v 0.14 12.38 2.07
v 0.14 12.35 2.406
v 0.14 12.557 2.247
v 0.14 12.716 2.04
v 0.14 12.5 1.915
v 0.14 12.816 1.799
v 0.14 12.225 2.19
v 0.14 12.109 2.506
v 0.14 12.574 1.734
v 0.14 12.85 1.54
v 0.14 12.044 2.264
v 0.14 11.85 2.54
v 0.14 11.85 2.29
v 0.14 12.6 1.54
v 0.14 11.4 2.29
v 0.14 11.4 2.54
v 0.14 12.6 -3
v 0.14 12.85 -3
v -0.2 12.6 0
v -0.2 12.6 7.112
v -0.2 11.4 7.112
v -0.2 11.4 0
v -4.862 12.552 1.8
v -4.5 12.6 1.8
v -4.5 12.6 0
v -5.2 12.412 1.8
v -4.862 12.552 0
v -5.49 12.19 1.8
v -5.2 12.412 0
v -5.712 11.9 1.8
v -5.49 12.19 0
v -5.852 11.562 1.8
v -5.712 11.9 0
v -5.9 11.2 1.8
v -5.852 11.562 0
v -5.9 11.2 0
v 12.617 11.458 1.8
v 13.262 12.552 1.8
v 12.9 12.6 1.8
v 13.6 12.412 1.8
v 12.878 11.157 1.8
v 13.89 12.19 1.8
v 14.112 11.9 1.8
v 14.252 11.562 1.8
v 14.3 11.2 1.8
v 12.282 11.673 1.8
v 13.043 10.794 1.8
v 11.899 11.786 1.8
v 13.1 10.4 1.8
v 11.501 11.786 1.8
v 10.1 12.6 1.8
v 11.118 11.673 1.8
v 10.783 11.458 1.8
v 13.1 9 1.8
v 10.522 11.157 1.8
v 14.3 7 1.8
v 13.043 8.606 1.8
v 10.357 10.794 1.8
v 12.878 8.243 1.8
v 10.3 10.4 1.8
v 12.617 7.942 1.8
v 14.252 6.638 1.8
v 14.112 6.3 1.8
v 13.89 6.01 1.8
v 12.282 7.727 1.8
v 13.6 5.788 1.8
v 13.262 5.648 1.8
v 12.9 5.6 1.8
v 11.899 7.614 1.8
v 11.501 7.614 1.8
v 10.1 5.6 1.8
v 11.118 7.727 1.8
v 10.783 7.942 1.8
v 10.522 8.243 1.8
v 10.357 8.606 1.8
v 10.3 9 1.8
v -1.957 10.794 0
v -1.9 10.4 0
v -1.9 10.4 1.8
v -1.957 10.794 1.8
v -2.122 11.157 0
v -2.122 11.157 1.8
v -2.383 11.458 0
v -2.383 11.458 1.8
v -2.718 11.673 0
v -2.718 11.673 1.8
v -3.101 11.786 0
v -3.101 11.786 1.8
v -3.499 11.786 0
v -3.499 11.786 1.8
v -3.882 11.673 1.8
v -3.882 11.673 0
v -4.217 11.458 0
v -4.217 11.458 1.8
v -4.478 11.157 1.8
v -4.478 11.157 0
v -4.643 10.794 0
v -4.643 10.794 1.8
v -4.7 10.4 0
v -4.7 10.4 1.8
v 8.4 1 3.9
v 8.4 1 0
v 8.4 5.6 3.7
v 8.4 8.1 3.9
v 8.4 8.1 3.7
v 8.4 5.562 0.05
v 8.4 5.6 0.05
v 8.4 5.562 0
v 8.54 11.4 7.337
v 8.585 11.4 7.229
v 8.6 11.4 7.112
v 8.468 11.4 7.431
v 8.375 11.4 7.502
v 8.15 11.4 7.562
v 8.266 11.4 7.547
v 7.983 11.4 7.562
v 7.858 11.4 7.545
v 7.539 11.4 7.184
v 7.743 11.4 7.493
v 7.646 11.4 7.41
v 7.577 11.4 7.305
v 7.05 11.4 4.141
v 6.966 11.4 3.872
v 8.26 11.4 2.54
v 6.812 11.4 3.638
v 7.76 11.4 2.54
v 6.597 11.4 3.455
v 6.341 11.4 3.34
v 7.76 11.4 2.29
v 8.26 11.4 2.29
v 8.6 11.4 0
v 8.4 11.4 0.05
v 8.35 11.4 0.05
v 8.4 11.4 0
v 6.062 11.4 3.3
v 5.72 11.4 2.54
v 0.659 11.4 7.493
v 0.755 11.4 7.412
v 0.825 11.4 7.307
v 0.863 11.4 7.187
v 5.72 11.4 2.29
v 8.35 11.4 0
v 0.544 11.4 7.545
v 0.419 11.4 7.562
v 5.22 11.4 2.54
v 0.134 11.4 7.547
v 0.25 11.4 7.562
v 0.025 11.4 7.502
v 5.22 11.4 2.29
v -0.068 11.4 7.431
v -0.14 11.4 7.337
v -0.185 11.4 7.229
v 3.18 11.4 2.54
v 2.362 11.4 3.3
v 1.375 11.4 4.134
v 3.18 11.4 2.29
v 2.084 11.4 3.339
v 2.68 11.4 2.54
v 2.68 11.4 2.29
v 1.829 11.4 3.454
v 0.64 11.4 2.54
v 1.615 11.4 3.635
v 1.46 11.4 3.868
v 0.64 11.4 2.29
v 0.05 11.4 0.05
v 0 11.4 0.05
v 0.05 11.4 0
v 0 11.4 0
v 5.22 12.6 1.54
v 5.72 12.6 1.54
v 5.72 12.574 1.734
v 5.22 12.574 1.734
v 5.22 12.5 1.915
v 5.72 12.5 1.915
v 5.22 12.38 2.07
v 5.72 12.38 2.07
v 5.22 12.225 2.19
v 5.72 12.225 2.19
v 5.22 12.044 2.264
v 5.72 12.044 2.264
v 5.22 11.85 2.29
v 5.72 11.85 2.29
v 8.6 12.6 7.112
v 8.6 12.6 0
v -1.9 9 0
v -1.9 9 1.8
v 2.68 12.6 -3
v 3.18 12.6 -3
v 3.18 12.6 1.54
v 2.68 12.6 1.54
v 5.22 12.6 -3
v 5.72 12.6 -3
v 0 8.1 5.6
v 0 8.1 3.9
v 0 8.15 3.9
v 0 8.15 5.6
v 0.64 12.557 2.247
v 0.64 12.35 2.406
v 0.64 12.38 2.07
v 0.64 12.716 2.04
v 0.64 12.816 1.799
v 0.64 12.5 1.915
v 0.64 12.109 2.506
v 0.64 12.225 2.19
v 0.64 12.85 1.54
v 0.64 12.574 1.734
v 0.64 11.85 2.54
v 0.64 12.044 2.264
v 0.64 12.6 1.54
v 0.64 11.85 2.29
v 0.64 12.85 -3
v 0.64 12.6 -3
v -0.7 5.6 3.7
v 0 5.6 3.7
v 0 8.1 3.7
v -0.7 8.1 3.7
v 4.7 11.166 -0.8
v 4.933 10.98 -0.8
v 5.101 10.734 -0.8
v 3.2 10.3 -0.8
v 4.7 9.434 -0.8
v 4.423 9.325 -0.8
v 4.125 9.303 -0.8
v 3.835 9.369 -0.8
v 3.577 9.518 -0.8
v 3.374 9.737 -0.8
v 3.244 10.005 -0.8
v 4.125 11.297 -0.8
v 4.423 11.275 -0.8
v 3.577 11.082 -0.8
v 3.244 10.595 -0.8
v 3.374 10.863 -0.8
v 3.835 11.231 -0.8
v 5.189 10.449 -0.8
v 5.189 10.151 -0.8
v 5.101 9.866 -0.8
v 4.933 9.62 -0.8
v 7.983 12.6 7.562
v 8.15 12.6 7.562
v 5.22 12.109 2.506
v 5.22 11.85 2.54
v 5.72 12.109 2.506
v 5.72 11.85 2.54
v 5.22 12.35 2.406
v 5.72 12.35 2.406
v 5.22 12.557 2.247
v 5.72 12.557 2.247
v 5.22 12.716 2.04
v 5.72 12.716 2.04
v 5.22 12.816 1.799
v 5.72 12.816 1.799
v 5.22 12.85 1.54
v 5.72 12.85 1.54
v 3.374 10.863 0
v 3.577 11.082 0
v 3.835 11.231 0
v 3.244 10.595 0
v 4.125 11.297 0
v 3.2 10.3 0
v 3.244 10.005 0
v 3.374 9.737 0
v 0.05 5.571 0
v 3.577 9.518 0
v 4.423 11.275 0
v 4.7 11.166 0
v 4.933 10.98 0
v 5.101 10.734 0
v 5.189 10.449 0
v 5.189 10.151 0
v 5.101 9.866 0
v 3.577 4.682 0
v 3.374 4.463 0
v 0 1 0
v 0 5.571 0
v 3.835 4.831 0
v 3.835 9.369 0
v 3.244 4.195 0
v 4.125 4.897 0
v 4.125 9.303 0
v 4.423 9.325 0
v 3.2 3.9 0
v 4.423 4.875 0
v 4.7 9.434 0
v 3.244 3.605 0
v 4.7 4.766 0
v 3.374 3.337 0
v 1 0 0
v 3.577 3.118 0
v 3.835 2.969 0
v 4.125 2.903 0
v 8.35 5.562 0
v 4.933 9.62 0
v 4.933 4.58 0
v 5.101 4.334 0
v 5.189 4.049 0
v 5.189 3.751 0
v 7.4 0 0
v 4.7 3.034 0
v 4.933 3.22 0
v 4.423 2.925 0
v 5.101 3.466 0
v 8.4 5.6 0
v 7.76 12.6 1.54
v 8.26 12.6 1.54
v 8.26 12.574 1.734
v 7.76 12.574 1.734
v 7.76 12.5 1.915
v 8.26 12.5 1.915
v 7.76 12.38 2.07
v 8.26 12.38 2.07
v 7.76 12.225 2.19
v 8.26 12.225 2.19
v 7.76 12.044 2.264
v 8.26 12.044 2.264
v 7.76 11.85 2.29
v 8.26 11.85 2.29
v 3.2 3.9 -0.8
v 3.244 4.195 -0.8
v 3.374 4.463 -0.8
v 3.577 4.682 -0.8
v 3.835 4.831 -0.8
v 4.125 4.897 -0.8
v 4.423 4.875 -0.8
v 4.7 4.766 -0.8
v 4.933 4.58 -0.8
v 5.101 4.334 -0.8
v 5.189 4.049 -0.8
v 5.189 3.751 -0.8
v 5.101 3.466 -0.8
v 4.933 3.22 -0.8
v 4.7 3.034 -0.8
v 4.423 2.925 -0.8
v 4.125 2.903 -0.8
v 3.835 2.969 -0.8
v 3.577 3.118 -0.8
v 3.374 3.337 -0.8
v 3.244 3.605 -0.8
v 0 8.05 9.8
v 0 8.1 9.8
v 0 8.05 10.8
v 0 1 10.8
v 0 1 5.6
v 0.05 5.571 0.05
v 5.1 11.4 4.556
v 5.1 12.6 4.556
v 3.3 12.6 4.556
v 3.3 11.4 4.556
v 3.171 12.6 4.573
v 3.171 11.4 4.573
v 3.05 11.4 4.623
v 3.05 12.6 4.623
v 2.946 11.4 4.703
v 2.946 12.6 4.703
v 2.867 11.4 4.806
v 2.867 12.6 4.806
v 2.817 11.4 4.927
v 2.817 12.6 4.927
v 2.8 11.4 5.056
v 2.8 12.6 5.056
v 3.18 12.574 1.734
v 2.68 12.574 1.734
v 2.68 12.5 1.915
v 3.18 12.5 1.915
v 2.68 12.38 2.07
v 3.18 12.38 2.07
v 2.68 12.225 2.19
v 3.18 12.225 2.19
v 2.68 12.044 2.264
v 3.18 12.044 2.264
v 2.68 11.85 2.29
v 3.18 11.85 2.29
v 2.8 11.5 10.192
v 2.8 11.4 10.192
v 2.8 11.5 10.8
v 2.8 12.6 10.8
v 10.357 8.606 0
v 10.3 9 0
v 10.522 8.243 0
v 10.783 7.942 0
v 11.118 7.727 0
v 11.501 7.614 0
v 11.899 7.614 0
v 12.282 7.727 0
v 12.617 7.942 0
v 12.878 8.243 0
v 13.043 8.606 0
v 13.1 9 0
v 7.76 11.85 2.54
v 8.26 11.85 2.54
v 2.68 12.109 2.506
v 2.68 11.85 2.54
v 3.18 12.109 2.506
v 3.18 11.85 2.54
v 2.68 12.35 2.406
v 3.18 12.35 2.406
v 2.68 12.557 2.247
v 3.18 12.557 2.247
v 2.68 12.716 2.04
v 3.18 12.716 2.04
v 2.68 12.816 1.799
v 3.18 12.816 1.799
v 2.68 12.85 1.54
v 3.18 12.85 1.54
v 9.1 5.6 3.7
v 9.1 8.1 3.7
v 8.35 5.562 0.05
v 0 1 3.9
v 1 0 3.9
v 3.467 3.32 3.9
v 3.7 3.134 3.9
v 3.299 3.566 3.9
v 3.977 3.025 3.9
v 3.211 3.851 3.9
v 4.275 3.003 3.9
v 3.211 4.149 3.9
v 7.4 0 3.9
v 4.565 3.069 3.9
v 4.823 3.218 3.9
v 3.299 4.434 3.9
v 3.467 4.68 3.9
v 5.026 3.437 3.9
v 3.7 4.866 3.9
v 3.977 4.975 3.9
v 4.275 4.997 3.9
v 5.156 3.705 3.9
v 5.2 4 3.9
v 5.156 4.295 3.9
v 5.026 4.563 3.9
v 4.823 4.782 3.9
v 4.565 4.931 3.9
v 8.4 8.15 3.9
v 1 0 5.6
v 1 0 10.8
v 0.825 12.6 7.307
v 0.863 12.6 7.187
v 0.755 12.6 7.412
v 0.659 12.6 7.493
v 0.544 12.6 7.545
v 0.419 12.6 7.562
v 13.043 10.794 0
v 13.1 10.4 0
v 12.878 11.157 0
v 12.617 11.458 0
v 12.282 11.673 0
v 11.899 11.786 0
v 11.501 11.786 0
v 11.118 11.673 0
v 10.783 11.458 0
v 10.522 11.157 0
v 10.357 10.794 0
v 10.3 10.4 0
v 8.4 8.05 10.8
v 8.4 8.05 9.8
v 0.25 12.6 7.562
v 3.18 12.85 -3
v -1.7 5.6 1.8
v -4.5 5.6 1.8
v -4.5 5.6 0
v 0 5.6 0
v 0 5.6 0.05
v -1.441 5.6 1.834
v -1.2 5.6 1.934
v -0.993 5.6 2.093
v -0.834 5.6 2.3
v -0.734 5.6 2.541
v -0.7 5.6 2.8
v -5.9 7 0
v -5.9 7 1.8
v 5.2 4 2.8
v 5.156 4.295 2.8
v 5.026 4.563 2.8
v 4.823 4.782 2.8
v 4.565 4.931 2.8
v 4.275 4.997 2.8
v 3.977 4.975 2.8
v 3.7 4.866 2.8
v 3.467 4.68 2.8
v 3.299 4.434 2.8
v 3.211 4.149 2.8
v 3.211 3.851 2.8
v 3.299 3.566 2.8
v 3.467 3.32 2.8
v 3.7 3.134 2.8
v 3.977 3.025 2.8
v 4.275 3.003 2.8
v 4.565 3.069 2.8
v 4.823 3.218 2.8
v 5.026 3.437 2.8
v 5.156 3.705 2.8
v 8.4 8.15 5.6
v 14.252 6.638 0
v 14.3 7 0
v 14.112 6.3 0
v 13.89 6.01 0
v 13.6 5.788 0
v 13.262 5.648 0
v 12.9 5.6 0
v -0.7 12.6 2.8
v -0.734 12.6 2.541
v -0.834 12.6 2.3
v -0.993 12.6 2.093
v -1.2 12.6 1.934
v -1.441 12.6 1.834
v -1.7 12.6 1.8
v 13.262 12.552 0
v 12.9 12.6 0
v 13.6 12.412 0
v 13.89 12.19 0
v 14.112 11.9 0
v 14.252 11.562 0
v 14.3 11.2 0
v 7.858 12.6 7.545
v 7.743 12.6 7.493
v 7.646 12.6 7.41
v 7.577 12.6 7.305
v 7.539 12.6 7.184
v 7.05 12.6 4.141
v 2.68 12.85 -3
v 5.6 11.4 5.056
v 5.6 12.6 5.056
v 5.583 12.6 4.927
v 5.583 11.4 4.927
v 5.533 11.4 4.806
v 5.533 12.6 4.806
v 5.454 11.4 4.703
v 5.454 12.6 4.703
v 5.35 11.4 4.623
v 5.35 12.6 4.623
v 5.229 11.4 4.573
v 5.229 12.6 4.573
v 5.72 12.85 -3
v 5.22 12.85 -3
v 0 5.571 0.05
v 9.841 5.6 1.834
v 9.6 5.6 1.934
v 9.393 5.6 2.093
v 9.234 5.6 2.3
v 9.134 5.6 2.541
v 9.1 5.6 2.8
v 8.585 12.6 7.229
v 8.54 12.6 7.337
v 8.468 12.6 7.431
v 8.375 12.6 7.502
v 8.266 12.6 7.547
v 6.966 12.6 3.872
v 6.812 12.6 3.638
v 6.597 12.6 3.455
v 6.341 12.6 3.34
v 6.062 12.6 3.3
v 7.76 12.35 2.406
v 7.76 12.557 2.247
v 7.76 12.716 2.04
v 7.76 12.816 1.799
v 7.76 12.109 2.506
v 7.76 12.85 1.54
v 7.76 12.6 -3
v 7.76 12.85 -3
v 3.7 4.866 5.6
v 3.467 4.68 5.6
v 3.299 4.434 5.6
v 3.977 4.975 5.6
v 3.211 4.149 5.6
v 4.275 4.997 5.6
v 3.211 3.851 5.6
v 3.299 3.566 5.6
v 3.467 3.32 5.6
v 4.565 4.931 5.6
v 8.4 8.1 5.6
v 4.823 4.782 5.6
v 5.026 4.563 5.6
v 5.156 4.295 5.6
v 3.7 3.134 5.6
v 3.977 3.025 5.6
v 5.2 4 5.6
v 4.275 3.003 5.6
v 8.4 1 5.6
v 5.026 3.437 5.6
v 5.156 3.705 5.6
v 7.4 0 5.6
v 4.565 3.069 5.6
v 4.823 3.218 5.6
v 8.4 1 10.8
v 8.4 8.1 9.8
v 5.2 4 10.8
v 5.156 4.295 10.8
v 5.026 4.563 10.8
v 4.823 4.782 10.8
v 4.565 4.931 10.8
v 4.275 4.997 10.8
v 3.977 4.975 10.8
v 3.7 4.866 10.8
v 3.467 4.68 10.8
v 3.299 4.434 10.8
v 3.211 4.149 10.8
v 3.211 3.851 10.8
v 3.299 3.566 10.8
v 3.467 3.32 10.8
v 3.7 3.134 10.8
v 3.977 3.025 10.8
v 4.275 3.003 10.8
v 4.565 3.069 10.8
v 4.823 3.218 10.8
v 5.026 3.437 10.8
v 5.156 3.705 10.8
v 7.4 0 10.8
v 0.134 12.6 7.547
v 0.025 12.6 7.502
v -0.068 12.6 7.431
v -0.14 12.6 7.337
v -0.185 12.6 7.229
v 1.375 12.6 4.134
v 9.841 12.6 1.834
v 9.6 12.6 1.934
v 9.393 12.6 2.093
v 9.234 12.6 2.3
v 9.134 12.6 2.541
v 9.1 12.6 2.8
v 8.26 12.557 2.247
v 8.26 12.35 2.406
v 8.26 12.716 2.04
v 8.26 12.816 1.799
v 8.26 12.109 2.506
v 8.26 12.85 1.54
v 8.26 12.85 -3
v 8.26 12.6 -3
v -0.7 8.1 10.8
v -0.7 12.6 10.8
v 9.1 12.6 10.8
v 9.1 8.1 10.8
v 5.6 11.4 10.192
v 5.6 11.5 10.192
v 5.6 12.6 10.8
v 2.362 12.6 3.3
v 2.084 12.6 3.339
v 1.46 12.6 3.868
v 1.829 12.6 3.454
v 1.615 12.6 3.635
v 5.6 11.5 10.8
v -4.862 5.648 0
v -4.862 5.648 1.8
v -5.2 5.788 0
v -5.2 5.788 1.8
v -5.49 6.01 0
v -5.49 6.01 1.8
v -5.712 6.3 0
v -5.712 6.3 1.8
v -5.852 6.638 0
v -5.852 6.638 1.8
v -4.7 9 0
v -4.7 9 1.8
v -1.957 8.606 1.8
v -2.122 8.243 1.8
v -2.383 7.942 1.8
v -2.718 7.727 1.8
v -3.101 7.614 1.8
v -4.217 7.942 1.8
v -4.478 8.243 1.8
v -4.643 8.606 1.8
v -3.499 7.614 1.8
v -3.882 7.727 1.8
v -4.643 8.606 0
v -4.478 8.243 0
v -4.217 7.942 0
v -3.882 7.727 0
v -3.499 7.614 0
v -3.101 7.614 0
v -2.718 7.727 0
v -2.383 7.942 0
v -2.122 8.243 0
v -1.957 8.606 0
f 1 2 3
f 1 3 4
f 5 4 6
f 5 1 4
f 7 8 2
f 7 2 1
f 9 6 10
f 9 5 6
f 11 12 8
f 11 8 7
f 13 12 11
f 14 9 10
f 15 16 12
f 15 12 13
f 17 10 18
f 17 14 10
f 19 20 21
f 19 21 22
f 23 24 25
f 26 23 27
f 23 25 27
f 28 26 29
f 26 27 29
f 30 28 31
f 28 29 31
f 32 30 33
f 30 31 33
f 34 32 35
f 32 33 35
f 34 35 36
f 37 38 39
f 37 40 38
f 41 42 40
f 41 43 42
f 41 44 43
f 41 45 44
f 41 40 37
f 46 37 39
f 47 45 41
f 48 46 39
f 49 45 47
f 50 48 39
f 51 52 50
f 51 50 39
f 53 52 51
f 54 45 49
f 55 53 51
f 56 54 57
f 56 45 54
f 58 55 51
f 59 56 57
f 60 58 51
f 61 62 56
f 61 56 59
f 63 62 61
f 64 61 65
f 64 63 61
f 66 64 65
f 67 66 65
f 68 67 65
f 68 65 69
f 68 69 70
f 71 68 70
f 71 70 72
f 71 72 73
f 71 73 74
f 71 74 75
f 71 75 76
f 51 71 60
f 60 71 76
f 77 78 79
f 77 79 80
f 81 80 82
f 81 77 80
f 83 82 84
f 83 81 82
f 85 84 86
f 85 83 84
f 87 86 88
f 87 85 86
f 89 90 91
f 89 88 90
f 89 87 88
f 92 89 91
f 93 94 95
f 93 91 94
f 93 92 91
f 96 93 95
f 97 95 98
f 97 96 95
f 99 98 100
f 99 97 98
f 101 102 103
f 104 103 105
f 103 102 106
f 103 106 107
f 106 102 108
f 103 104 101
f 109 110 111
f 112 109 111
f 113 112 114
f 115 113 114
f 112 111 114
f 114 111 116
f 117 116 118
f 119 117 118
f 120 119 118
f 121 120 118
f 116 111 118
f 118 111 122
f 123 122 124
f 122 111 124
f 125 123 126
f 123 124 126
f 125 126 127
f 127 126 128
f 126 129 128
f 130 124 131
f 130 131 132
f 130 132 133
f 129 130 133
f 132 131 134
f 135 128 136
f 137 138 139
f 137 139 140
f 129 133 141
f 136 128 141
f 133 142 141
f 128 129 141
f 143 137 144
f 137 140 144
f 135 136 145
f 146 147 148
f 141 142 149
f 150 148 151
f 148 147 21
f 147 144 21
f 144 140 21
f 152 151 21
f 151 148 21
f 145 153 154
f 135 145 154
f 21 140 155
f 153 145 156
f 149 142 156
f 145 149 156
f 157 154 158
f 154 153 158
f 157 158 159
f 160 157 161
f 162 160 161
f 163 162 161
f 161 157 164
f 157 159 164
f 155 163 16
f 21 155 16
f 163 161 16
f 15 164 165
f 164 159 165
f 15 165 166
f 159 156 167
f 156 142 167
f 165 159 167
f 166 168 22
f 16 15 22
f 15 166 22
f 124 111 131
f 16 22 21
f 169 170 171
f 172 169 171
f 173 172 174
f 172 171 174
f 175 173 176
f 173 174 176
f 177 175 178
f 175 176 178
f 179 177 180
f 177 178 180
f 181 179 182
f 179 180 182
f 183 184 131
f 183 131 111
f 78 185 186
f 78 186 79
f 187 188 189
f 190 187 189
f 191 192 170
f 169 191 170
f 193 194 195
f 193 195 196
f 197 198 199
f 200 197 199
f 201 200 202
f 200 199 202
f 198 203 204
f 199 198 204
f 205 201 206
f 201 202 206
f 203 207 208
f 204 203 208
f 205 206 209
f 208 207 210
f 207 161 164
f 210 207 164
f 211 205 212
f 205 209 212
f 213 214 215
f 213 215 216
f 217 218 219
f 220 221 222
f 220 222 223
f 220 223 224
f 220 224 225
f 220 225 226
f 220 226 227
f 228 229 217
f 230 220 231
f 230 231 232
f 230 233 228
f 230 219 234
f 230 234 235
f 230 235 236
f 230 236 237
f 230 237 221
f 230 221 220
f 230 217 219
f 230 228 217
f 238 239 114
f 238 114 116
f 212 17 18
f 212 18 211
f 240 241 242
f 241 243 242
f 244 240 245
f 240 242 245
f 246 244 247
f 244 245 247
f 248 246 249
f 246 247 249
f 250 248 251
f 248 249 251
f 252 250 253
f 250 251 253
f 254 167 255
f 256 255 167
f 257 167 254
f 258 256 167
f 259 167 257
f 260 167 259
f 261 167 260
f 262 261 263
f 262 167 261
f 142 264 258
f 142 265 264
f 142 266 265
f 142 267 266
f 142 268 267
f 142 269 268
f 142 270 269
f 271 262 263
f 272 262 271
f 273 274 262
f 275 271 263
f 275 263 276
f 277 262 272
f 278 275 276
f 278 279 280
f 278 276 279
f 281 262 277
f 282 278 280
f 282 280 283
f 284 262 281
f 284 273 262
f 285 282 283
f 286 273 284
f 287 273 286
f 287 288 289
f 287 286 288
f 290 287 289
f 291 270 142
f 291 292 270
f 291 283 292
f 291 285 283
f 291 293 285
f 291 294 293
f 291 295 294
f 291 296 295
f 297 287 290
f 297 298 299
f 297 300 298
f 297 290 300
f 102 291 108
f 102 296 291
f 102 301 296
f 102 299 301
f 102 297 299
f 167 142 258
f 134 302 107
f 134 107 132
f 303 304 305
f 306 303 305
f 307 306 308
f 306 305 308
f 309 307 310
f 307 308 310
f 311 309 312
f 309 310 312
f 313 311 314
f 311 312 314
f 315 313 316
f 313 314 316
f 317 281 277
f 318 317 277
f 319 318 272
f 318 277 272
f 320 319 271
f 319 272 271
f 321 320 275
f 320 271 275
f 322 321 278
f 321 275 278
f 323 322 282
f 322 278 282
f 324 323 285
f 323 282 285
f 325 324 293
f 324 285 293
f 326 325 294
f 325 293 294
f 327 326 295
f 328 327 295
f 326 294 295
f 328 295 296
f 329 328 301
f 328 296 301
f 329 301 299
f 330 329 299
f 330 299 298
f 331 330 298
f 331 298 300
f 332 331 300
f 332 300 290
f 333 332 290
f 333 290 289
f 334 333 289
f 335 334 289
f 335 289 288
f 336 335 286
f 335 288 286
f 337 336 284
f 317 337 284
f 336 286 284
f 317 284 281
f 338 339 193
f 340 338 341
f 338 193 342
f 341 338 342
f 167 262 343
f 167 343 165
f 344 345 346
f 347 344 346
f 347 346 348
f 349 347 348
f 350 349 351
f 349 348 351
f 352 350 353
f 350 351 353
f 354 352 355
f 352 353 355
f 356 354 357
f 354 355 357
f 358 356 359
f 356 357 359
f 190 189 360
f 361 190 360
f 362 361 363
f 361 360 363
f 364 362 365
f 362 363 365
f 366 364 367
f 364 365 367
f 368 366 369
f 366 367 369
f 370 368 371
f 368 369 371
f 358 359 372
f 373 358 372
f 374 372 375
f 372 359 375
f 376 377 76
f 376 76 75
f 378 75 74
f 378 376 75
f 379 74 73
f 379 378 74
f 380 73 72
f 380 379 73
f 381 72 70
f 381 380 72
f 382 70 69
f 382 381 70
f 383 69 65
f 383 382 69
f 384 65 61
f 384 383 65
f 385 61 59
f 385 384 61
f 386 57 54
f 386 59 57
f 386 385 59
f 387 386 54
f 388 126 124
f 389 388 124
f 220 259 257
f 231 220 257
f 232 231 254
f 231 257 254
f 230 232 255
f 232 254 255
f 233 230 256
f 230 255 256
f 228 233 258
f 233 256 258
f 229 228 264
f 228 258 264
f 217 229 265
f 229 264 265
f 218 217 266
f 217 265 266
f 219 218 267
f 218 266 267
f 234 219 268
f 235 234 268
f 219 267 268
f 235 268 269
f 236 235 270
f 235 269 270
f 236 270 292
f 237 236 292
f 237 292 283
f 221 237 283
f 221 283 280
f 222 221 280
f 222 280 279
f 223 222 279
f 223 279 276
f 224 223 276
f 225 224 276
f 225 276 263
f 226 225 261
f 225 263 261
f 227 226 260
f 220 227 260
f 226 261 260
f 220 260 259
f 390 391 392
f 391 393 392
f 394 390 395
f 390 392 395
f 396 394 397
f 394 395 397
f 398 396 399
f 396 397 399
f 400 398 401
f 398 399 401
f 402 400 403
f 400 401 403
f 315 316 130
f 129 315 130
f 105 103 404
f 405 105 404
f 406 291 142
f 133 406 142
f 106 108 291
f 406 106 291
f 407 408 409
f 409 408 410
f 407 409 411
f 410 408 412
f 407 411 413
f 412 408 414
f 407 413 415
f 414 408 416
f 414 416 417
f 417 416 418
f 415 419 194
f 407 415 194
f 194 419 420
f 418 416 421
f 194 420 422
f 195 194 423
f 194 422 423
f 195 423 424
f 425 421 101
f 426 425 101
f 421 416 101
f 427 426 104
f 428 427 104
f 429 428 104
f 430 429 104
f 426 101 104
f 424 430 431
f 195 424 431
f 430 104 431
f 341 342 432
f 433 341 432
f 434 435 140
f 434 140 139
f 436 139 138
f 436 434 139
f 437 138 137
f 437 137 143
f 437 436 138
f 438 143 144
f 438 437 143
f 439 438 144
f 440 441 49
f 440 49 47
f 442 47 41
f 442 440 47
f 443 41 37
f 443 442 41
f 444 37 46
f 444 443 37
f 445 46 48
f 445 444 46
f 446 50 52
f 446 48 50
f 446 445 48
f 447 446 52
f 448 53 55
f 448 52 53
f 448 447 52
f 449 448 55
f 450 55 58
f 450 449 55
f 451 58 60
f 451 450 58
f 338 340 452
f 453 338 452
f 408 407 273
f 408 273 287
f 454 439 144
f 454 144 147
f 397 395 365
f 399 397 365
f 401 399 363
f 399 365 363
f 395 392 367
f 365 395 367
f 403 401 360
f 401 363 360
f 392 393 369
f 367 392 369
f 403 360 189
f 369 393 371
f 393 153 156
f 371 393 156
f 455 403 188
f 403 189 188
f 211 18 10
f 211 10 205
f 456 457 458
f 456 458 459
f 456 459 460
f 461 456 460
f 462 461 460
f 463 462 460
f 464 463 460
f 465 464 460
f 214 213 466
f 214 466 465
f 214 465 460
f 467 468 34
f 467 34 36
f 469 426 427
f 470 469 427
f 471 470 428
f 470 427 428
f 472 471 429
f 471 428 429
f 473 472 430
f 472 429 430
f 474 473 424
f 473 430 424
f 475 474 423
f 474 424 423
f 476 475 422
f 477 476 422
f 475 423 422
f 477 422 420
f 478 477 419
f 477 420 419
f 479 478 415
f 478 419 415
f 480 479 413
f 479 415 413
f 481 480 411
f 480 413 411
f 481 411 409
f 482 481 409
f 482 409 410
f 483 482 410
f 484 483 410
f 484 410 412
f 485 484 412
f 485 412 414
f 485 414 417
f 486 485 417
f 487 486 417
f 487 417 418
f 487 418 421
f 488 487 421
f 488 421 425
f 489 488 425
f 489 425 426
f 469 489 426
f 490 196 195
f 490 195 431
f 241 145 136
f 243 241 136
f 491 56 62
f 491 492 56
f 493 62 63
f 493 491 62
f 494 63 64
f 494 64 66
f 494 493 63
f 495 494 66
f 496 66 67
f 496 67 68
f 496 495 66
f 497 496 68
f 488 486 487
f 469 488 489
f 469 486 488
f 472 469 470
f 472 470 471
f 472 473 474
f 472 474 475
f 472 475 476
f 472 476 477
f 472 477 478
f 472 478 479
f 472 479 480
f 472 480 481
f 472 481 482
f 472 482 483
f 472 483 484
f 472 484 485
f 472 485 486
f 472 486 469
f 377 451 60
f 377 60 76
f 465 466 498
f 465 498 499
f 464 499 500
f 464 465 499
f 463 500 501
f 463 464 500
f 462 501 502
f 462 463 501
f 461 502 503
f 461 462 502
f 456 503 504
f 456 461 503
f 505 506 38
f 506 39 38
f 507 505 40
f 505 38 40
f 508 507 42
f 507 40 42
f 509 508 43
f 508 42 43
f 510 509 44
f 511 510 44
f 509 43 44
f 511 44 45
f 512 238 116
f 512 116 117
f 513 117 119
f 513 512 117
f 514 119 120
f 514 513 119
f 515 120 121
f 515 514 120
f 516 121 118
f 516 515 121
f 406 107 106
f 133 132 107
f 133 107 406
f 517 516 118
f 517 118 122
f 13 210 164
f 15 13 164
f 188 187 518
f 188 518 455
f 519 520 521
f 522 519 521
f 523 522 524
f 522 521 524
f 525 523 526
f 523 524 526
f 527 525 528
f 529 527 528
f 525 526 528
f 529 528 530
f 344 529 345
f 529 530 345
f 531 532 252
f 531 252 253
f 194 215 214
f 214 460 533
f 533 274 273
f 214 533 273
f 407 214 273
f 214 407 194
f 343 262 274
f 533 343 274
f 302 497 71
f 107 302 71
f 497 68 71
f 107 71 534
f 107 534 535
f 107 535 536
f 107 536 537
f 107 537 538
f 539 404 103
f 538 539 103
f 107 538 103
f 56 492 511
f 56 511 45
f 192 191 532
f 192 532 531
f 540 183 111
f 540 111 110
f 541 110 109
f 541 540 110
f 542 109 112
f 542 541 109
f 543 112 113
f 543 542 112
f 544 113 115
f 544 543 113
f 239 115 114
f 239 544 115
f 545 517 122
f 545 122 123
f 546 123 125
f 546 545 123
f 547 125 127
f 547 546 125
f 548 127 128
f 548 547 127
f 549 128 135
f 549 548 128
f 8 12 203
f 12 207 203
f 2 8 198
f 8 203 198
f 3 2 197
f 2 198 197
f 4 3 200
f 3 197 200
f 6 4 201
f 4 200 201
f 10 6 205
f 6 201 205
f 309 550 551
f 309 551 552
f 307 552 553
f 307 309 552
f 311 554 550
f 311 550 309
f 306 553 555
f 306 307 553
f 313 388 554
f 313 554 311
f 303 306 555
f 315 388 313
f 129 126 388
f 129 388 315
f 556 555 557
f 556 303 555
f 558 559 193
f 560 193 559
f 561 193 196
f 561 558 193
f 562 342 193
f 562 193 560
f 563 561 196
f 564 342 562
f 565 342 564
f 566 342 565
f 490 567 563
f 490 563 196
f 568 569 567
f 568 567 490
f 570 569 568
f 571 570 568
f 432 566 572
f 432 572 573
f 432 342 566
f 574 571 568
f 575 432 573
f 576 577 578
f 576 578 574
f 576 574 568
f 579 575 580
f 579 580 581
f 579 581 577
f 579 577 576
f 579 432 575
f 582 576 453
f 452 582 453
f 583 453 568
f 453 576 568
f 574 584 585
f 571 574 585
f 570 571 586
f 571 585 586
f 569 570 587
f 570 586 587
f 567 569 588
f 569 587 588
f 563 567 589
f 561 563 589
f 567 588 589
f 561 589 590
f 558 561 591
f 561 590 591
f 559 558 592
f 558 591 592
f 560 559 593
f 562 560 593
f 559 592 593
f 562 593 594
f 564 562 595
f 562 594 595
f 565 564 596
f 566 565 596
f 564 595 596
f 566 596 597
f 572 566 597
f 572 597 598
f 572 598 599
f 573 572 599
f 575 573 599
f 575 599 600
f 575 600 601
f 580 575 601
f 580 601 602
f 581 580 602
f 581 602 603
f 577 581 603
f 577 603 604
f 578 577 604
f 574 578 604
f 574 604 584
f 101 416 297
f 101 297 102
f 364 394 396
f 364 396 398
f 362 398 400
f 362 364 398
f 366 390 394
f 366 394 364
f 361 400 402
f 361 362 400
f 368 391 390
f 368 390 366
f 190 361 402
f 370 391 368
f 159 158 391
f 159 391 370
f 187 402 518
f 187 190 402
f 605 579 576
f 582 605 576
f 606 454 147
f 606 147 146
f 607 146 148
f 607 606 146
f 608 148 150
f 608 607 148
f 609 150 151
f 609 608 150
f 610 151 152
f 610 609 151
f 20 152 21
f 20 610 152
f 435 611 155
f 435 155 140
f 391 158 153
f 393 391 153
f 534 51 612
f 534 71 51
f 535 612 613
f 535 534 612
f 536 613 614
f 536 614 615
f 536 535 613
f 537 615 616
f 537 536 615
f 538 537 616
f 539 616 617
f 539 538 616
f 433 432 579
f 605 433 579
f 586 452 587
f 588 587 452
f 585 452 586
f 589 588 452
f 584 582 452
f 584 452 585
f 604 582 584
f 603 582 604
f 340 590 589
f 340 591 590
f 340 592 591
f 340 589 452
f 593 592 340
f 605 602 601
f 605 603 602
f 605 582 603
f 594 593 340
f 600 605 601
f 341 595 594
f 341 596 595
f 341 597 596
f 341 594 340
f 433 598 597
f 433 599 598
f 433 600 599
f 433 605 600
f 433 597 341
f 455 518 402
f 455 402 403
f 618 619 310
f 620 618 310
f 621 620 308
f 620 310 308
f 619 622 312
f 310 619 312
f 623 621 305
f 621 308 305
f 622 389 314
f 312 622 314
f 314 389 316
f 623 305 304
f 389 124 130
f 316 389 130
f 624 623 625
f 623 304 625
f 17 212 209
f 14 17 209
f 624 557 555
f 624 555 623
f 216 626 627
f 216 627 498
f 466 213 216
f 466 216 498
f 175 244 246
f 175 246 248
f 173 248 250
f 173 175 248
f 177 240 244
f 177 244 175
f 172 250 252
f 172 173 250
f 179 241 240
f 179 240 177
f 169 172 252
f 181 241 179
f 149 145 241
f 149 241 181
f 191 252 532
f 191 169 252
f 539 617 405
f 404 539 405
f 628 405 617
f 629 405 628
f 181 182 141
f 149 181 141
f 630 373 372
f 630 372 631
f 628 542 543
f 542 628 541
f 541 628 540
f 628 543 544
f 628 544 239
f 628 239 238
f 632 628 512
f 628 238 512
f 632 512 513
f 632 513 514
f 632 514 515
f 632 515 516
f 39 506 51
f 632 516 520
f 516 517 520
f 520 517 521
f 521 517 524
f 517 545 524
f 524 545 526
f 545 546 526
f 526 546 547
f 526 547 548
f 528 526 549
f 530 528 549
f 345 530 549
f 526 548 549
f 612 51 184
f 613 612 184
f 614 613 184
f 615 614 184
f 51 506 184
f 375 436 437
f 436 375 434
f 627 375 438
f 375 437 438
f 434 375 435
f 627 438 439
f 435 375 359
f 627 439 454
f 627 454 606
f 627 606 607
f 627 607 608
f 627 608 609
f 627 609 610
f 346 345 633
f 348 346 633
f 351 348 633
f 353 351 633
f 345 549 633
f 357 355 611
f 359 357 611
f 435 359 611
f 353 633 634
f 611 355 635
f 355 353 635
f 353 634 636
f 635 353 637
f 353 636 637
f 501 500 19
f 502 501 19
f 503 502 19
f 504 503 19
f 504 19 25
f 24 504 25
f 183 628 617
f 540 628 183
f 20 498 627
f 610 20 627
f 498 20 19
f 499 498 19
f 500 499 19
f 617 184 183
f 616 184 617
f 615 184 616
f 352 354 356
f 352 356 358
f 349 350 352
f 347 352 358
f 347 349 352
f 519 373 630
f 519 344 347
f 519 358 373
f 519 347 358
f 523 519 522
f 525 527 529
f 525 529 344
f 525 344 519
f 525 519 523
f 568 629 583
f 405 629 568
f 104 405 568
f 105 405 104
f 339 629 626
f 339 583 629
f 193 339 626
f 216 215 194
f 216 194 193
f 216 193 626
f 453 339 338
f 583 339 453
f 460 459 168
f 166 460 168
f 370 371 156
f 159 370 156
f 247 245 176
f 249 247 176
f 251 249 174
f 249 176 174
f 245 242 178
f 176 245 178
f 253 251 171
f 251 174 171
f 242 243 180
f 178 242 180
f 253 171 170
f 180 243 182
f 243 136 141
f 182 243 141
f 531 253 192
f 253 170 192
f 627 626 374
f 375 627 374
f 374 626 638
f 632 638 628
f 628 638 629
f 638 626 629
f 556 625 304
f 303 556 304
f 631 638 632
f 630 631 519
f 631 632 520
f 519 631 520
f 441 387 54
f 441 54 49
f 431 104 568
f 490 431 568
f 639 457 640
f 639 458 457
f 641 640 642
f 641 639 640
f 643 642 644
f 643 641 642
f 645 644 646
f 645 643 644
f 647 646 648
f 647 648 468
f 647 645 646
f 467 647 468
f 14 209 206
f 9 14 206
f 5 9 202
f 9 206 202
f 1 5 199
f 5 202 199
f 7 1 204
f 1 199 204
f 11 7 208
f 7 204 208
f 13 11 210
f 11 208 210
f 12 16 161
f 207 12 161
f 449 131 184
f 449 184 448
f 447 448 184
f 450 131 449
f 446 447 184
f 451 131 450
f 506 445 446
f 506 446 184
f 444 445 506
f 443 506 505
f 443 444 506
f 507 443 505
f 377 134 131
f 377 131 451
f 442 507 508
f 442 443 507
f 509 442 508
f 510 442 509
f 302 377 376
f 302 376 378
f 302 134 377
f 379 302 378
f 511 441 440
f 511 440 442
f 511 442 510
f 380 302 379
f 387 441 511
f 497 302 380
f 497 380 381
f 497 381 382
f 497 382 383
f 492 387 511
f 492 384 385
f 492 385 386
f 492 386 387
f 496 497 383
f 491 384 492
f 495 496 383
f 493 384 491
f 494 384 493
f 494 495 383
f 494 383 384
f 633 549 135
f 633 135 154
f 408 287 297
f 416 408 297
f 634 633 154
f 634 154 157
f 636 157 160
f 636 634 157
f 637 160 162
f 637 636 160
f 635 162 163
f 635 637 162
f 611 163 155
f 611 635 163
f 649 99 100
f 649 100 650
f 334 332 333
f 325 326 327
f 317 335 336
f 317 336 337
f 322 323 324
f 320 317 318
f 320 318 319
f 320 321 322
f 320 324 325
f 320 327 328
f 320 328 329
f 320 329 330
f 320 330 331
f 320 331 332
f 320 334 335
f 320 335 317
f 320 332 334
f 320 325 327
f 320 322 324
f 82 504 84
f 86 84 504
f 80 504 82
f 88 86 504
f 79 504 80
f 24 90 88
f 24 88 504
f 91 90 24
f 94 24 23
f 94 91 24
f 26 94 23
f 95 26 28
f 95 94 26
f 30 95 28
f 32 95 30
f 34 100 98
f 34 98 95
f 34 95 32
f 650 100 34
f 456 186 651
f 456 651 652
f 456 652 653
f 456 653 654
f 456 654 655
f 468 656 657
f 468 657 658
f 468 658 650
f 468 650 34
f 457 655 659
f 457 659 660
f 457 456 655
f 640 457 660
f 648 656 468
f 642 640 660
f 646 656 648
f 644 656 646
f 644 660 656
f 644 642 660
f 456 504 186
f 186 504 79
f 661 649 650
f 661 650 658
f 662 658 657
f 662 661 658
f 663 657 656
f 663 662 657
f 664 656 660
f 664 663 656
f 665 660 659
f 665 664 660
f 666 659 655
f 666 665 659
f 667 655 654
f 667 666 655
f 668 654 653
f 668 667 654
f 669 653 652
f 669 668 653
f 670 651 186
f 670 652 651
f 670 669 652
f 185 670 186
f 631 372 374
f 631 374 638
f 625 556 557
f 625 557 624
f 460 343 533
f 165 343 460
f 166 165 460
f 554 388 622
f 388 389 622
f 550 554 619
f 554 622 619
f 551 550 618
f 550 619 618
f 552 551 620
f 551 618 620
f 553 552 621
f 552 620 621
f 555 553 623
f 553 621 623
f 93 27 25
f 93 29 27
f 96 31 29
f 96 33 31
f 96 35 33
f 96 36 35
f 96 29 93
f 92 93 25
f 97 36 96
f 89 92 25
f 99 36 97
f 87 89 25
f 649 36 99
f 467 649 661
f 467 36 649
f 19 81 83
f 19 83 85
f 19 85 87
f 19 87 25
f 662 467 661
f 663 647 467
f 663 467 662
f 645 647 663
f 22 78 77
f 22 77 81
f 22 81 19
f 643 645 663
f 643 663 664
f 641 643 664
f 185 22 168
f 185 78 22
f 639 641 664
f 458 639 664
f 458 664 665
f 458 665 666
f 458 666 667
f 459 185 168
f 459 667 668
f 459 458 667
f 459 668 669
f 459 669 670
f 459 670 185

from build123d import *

# Parameters (mm, degrees)
EXTRUDE_1_DEPTH      = 10.8
SKETCH_2_R           = 1
EXTRUDE_2_DEPTH      = 0.8
SKETCH_3_W           = 1.7
SKETCH_3_H           = 8.1
CUT_EXTRUDE_1_DEPTH  = 17.8
EXTRUDE_START        = -4.5
EXTRUDE_3_DEPTH      = 4.5
SKETCH_5_W           = 8.4
SKETCH_5_H           = 0.05
CUT_EXTRUDE_2_DEPTH  = 1
SKETCH_6_R           = 1
CUT_EXTRUDE_3_DEPTH  = 8
CUT_EXTRUDE_4_DEPTH  = 1.2
SKETCH_8_W           = 2.8
SKETCH_8_H           = 0.608363533
EXTRUDE_4_DEPTH      = 0.1
EXTRUDE_START_2      = 2.5
EXTRUDE_5_DEPTH      = 2.5
SKETCH_10_W          = 8.4
SKETCH_10_H          = 1.7
CUT_EXTRUDE_5_DEPTH  = 0.05
FILLET_1_R           = 1.4
SKETCH_11_W          = 0.05
SKETCH_11_H          = 5.83834946
SKETCH_11_H_2        = 5.828769054
CUT_EXTRUDE_8_DEPTH  = 0.05
CUT_EXTRUDE_9_DEPTH  = 4
SKETCH_13_W          = 0.5
SKETCH_13_H          = 5.54
EXTRUDE_6_DEPTH      = 1.45
FILLET_2_R           = 1
CUT_EXTRUDE_START    = -8.12
CUT_EXTRUDE_10_DEPTH = 8.12


with BuildPart() as part:
    # Эскиз1 → Бобышка-Вытянуть1 (new body)
    with BuildSketch(Plane.XY):
        Polygon((7.4, 0), (8.4, 1), (8.4, 12.6), (0, 12.6), (0, 1), (1, 0), align=None)
    extrude(amount=EXTRUDE_1_DEPTH)

    # Эскиз2 → Бобышка-Вытянуть2 (add)
    with BuildSketch(Plane(origin=(0, 0, 0), x_dir=(-1, 0, 0), z_dir=(0, 0, -1))):
        with Locations((-4.2, 10.3)):
            Circle(SKETCH_2_R)
        with Locations((-4.2, 3.9)):
            Circle(SKETCH_2_R)
    extrude(amount=EXTRUDE_2_DEPTH)

    # Эскиз3 → Вырез-Вытянуть1 (cut)
    with BuildSketch(Plane(origin=(8.4, 0, 0), x_dir=(0, 0, -1), z_dir=(1, 0, 0))):
        with Locations((-4.75, 4.05)):
            Rectangle(SKETCH_3_W, SKETCH_3_H)
    extrude(amount=-CUT_EXTRUDE_1_DEPTH, mode=Mode.SUBTRACT)

    # Эскиз4 → Бобышка-Вытянуть3 (add)
    with BuildSketch(Plane(origin=(0, 12.6, 0), x_dir=(1, 0, 0), z_dir=(0, 1, 0)).offset(EXTRUDE_START)):
        with BuildLine():
            Line((9.1, -10.8), (-0.7, -10.8))
            Line((-0.7, -10.8), (-0.7, -2.8))
            ThreePointArc((-0.7, -2.8), (-0.992893219, -2.092893219), (-1.7, -1.8))
            Line((-1.7, -1.8), (-5.9, -1.8))
            Line((-5.9, -1.8), (-5.9, 0))
            Line((-5.9, 0), (14.3, 0))
            Line((14.3, 0), (14.3, -1.8))
            Line((14.3, -1.8), (10.1, -1.8))
            ThreePointArc((10.1, -1.8), (9.392893219, -2.092893219), (9.1, -2.8))
            Line((9.1, -2.8), (9.1, -10.8))
        make_face()
    extrude(amount=EXTRUDE_3_DEPTH)

    # Эскиз5 → Вырез-Вытянуть2 (cut)
    with BuildSketch(Plane.XY.offset(10.8)):
        with Locations((4.2, 8.075)):
            Rectangle(SKETCH_5_W, SKETCH_5_H)
    extrude(amount=-CUT_EXTRUDE_2_DEPTH, mode=Mode.SUBTRACT)

    # Эскиз6 → Вырез-Вытянуть3 (cut)
    with BuildSketch(Plane.XY.offset(10.8)):
        with Locations((4.2, 4)):
            Circle(SKETCH_6_R)
    extrude(amount=-CUT_EXTRUDE_3_DEPTH, mode=Mode.SUBTRACT)

    # Эскиз7 → Вырез-Вытянуть4 (cut)
    with BuildSketch(Plane(origin=(0, 12.6, 0), x_dir=(1, 0, 0), z_dir=(0, 1, 0))):
        with BuildLine():
            Line((8.6, 0), (8.6, -7.112411136))
            ThreePointArc((8.6, -7.112411136), (8.468198052, -7.430609188), (8.15, -7.562411136))
            Line((8.15, -7.562411136), (7.983405928, -7.562411136))
            ThreePointArc((7.983405928, -7.562411136), (7.691564003, -7.454943311), (7.539115931, -7.183870205))
            Line((7.539115931, -7.183870205), (7.049736844, -4.141202068))
            ThreePointArc((7.049736844, -4.141202068), (6.710963351, -3.53881739), (6.062425739, -3.3))
            Line((6.062425739, -3.3), (2.361664993, -3.3))
            ThreePointArc((2.361664993, -3.3), (1.71573807, -3.536600753), (1.37546474, -4.13444318))
            Line((1.37546474, -4.13444318), (0.863036378, -7.186911705))
            ThreePointArc((0.863036378, -7.186911705), (0.709913379, -7.455940797), (0.419246264, -7.562411136))
            Line((0.419246264, -7.562411136), (0.25, -7.562411136))
            ThreePointArc((0.25, -7.562411136), (-0.068198052, -7.430609188), (-0.2, -7.112411136))
            Line((-0.2, -7.112411136), (-0.2, 0))
            Line((-0.2, 0), (8.6, 0))
        make_face()
        with BuildLine():
            Line((4.2, -10.8), (5.6, -10.8))
            Line((5.6, -10.8), (5.6, -5.056380156))
            ThreePointArc((5.6, -5.056380156), (5.453553391, -4.702826765), (5.1, -4.556380156))
            Line((5.1, -4.556380156), (3.3, -4.556380156))
            ThreePointArc((3.3, -4.556380156), (2.946446609, -4.702826765), (2.8, -5.056380156))
            Line((2.8, -5.056380156), (2.8, -10.8))
            Line((2.8, -10.8), (4.2, -10.8))
        make_face()
    extrude(amount=-CUT_EXTRUDE_4_DEPTH, mode=Mode.SUBTRACT)

    # Эскиз8 → Бобышка-Вытянуть4 (add)
    with BuildSketch(Plane(origin=(0, 11.4, 0), x_dir=(1, 0, 0), z_dir=(0, 1, 0))):
        with Locations((4.2, -10.495818233)):
            Rectangle(SKETCH_8_W, SKETCH_8_H)
    extrude(amount=EXTRUDE_4_DEPTH)

    # Эскиз9 → Бобышка-Вытянуть5 (add)
    with BuildSketch(Plane.XZ.offset(-8.1).offset(EXTRUDE_START_2)):
        with BuildLine():
            Line((0, 0), (0, 3.7))
            Line((0, 3.7), (-0.7, 3.7))
            Line((-0.7, 3.7), (-0.7, 2.8))
            ThreePointArc((-0.7, 2.8), (-0.992893219, 2.092893219), (-1.7, 1.8))
            Line((-1.7, 1.8), (-5.9, 1.8))
            Line((-5.9, 1.8), (-5.9, 0))
            Line((-5.9, 0), (0, 0))
        make_face()
        with BuildLine():
            Line((14.3, 0), (8.4, 0))
            Line((8.4, 0), (8.4, 3.7))
            Line((8.4, 3.7), (9.1, 3.7))
            Line((9.1, 3.7), (9.1, 2.8))
            ThreePointArc((9.1, 2.8), (9.392893219, 2.092893219), (10.1, 1.8))
            Line((10.1, 1.8), (14.3, 1.8))
            Line((14.3, 1.8), (14.3, 0))
        make_face()
    extrude(amount=-EXTRUDE_5_DEPTH)

    # Эскиз10 → Вырез-Вытянуть5 (cut)
    with BuildSketch(Plane.XZ.offset(-8.1)):
        with Locations((4.2, 4.75)):
            Rectangle(SKETCH_10_W, SKETCH_10_H)
    extrude(amount=-CUT_EXTRUDE_5_DEPTH, mode=Mode.SUBTRACT)

    # Скругление1
    fillet_1_edges = [part.edges().sort_by_distance(p)[0] for p in [
        (-5.9, 5.6, 0.9),
        (14.3, 5.6, 0.9),
        (14.3, 12.6, 0.9),
        (-5.9, 12.6, 0.9),
    ]]
    fillet(fillet_1_edges, radius=FILLET_1_R)

    # Эскиз11 → Вырез-Вытянуть8 (cut)
    with BuildSketch(Plane(origin=(0, 0, 0), x_dir=(-1, 0, 0), z_dir=(0, 0, -1))):
        with Locations((-8.375, 8.48082527)):
            Rectangle(SKETCH_11_W, SKETCH_11_H)
        with Locations((-0.025, 8.485615473)):
            Rectangle(SKETCH_11_W, SKETCH_11_H_2)
    extrude(amount=-CUT_EXTRUDE_8_DEPTH, mode=Mode.SUBTRACT)

    # Эскиз12 → Вырез-Вытянуть9 (cut)
    with BuildSketch(Plane(origin=(0, 0, 0), x_dir=(-1, 0, 0), z_dir=(0, 0, -1))):
        with BuildLine():
            Line((1.9, 9), (1.9, 10.4))
            ThreePointArc((1.9, 10.4), (3.3, 11.8), (4.7, 10.4))
            Line((4.7, 10.4), (4.7, 9))
            ThreePointArc((4.7, 9), (3.3, 7.6), (1.9, 9))
        make_face()
        with BuildLine():
            Line((-10.3, 10.4), (-10.3, 9))
            ThreePointArc((-10.3, 9), (-11.7, 7.6), (-13.1, 9))
            Line((-13.1, 9), (-13.1, 10.4))
            ThreePointArc((-13.1, 10.4), (-11.7, 11.8), (-10.3, 10.4))
        make_face()
    extrude(amount=-CUT_EXTRUDE_9_DEPTH, mode=Mode.SUBTRACT)

    # Эскиз13 → Бобышка-Вытянуть6 (add)
    with BuildSketch(Plane(origin=(0, 11.4, 0), x_dir=(1, 0, 0), z_dir=(0, 1, 0))):
        with Locations((5.47, 0.23)):
            Rectangle(SKETCH_13_W, SKETCH_13_H)
        with Locations((8.01, 0.23)):
            Rectangle(SKETCH_13_W, SKETCH_13_H)
        with Locations((2.93, 0.23)):
            Rectangle(SKETCH_13_W, SKETCH_13_H)
        with Locations((0.39, 0.23)):
            Rectangle(SKETCH_13_W, SKETCH_13_H)
    extrude(amount=EXTRUDE_6_DEPTH)

    # Скругление2
    fillet_2_edges = [part.edges().sort_by_distance(p)[0] for p in [
        (5.47, 12.85, 2.54),
        (2.93, 12.85, 2.54),
        (0.39, 12.85, 2.54),
        (8.01, 12.85, 2.54),
    ]]
    fillet(fillet_2_edges, radius=FILLET_2_R)

    # Эскиз14 → Вырез-Вытянуть10 (cut)
    with BuildSketch(Plane.ZY.offset(-0.14).offset(CUT_EXTRUDE_START)):
        with BuildLine():
            Line((-3, 12.6), (1.54, 12.6))
            ThreePointArc((1.54, 12.6), (2.070330086, 12.380330086), (2.29, 11.85))
            Line((2.29, 11.85), (2.29, 11.4))
            Line((2.29, 11.4), (-3, 11.4))
            Line((-3, 11.4), (-3, 12.6))
        make_face()
    extrude(amount=CUT_EXTRUDE_10_DEPTH, mode=Mode.SUBTRACT)


solid = part.part
